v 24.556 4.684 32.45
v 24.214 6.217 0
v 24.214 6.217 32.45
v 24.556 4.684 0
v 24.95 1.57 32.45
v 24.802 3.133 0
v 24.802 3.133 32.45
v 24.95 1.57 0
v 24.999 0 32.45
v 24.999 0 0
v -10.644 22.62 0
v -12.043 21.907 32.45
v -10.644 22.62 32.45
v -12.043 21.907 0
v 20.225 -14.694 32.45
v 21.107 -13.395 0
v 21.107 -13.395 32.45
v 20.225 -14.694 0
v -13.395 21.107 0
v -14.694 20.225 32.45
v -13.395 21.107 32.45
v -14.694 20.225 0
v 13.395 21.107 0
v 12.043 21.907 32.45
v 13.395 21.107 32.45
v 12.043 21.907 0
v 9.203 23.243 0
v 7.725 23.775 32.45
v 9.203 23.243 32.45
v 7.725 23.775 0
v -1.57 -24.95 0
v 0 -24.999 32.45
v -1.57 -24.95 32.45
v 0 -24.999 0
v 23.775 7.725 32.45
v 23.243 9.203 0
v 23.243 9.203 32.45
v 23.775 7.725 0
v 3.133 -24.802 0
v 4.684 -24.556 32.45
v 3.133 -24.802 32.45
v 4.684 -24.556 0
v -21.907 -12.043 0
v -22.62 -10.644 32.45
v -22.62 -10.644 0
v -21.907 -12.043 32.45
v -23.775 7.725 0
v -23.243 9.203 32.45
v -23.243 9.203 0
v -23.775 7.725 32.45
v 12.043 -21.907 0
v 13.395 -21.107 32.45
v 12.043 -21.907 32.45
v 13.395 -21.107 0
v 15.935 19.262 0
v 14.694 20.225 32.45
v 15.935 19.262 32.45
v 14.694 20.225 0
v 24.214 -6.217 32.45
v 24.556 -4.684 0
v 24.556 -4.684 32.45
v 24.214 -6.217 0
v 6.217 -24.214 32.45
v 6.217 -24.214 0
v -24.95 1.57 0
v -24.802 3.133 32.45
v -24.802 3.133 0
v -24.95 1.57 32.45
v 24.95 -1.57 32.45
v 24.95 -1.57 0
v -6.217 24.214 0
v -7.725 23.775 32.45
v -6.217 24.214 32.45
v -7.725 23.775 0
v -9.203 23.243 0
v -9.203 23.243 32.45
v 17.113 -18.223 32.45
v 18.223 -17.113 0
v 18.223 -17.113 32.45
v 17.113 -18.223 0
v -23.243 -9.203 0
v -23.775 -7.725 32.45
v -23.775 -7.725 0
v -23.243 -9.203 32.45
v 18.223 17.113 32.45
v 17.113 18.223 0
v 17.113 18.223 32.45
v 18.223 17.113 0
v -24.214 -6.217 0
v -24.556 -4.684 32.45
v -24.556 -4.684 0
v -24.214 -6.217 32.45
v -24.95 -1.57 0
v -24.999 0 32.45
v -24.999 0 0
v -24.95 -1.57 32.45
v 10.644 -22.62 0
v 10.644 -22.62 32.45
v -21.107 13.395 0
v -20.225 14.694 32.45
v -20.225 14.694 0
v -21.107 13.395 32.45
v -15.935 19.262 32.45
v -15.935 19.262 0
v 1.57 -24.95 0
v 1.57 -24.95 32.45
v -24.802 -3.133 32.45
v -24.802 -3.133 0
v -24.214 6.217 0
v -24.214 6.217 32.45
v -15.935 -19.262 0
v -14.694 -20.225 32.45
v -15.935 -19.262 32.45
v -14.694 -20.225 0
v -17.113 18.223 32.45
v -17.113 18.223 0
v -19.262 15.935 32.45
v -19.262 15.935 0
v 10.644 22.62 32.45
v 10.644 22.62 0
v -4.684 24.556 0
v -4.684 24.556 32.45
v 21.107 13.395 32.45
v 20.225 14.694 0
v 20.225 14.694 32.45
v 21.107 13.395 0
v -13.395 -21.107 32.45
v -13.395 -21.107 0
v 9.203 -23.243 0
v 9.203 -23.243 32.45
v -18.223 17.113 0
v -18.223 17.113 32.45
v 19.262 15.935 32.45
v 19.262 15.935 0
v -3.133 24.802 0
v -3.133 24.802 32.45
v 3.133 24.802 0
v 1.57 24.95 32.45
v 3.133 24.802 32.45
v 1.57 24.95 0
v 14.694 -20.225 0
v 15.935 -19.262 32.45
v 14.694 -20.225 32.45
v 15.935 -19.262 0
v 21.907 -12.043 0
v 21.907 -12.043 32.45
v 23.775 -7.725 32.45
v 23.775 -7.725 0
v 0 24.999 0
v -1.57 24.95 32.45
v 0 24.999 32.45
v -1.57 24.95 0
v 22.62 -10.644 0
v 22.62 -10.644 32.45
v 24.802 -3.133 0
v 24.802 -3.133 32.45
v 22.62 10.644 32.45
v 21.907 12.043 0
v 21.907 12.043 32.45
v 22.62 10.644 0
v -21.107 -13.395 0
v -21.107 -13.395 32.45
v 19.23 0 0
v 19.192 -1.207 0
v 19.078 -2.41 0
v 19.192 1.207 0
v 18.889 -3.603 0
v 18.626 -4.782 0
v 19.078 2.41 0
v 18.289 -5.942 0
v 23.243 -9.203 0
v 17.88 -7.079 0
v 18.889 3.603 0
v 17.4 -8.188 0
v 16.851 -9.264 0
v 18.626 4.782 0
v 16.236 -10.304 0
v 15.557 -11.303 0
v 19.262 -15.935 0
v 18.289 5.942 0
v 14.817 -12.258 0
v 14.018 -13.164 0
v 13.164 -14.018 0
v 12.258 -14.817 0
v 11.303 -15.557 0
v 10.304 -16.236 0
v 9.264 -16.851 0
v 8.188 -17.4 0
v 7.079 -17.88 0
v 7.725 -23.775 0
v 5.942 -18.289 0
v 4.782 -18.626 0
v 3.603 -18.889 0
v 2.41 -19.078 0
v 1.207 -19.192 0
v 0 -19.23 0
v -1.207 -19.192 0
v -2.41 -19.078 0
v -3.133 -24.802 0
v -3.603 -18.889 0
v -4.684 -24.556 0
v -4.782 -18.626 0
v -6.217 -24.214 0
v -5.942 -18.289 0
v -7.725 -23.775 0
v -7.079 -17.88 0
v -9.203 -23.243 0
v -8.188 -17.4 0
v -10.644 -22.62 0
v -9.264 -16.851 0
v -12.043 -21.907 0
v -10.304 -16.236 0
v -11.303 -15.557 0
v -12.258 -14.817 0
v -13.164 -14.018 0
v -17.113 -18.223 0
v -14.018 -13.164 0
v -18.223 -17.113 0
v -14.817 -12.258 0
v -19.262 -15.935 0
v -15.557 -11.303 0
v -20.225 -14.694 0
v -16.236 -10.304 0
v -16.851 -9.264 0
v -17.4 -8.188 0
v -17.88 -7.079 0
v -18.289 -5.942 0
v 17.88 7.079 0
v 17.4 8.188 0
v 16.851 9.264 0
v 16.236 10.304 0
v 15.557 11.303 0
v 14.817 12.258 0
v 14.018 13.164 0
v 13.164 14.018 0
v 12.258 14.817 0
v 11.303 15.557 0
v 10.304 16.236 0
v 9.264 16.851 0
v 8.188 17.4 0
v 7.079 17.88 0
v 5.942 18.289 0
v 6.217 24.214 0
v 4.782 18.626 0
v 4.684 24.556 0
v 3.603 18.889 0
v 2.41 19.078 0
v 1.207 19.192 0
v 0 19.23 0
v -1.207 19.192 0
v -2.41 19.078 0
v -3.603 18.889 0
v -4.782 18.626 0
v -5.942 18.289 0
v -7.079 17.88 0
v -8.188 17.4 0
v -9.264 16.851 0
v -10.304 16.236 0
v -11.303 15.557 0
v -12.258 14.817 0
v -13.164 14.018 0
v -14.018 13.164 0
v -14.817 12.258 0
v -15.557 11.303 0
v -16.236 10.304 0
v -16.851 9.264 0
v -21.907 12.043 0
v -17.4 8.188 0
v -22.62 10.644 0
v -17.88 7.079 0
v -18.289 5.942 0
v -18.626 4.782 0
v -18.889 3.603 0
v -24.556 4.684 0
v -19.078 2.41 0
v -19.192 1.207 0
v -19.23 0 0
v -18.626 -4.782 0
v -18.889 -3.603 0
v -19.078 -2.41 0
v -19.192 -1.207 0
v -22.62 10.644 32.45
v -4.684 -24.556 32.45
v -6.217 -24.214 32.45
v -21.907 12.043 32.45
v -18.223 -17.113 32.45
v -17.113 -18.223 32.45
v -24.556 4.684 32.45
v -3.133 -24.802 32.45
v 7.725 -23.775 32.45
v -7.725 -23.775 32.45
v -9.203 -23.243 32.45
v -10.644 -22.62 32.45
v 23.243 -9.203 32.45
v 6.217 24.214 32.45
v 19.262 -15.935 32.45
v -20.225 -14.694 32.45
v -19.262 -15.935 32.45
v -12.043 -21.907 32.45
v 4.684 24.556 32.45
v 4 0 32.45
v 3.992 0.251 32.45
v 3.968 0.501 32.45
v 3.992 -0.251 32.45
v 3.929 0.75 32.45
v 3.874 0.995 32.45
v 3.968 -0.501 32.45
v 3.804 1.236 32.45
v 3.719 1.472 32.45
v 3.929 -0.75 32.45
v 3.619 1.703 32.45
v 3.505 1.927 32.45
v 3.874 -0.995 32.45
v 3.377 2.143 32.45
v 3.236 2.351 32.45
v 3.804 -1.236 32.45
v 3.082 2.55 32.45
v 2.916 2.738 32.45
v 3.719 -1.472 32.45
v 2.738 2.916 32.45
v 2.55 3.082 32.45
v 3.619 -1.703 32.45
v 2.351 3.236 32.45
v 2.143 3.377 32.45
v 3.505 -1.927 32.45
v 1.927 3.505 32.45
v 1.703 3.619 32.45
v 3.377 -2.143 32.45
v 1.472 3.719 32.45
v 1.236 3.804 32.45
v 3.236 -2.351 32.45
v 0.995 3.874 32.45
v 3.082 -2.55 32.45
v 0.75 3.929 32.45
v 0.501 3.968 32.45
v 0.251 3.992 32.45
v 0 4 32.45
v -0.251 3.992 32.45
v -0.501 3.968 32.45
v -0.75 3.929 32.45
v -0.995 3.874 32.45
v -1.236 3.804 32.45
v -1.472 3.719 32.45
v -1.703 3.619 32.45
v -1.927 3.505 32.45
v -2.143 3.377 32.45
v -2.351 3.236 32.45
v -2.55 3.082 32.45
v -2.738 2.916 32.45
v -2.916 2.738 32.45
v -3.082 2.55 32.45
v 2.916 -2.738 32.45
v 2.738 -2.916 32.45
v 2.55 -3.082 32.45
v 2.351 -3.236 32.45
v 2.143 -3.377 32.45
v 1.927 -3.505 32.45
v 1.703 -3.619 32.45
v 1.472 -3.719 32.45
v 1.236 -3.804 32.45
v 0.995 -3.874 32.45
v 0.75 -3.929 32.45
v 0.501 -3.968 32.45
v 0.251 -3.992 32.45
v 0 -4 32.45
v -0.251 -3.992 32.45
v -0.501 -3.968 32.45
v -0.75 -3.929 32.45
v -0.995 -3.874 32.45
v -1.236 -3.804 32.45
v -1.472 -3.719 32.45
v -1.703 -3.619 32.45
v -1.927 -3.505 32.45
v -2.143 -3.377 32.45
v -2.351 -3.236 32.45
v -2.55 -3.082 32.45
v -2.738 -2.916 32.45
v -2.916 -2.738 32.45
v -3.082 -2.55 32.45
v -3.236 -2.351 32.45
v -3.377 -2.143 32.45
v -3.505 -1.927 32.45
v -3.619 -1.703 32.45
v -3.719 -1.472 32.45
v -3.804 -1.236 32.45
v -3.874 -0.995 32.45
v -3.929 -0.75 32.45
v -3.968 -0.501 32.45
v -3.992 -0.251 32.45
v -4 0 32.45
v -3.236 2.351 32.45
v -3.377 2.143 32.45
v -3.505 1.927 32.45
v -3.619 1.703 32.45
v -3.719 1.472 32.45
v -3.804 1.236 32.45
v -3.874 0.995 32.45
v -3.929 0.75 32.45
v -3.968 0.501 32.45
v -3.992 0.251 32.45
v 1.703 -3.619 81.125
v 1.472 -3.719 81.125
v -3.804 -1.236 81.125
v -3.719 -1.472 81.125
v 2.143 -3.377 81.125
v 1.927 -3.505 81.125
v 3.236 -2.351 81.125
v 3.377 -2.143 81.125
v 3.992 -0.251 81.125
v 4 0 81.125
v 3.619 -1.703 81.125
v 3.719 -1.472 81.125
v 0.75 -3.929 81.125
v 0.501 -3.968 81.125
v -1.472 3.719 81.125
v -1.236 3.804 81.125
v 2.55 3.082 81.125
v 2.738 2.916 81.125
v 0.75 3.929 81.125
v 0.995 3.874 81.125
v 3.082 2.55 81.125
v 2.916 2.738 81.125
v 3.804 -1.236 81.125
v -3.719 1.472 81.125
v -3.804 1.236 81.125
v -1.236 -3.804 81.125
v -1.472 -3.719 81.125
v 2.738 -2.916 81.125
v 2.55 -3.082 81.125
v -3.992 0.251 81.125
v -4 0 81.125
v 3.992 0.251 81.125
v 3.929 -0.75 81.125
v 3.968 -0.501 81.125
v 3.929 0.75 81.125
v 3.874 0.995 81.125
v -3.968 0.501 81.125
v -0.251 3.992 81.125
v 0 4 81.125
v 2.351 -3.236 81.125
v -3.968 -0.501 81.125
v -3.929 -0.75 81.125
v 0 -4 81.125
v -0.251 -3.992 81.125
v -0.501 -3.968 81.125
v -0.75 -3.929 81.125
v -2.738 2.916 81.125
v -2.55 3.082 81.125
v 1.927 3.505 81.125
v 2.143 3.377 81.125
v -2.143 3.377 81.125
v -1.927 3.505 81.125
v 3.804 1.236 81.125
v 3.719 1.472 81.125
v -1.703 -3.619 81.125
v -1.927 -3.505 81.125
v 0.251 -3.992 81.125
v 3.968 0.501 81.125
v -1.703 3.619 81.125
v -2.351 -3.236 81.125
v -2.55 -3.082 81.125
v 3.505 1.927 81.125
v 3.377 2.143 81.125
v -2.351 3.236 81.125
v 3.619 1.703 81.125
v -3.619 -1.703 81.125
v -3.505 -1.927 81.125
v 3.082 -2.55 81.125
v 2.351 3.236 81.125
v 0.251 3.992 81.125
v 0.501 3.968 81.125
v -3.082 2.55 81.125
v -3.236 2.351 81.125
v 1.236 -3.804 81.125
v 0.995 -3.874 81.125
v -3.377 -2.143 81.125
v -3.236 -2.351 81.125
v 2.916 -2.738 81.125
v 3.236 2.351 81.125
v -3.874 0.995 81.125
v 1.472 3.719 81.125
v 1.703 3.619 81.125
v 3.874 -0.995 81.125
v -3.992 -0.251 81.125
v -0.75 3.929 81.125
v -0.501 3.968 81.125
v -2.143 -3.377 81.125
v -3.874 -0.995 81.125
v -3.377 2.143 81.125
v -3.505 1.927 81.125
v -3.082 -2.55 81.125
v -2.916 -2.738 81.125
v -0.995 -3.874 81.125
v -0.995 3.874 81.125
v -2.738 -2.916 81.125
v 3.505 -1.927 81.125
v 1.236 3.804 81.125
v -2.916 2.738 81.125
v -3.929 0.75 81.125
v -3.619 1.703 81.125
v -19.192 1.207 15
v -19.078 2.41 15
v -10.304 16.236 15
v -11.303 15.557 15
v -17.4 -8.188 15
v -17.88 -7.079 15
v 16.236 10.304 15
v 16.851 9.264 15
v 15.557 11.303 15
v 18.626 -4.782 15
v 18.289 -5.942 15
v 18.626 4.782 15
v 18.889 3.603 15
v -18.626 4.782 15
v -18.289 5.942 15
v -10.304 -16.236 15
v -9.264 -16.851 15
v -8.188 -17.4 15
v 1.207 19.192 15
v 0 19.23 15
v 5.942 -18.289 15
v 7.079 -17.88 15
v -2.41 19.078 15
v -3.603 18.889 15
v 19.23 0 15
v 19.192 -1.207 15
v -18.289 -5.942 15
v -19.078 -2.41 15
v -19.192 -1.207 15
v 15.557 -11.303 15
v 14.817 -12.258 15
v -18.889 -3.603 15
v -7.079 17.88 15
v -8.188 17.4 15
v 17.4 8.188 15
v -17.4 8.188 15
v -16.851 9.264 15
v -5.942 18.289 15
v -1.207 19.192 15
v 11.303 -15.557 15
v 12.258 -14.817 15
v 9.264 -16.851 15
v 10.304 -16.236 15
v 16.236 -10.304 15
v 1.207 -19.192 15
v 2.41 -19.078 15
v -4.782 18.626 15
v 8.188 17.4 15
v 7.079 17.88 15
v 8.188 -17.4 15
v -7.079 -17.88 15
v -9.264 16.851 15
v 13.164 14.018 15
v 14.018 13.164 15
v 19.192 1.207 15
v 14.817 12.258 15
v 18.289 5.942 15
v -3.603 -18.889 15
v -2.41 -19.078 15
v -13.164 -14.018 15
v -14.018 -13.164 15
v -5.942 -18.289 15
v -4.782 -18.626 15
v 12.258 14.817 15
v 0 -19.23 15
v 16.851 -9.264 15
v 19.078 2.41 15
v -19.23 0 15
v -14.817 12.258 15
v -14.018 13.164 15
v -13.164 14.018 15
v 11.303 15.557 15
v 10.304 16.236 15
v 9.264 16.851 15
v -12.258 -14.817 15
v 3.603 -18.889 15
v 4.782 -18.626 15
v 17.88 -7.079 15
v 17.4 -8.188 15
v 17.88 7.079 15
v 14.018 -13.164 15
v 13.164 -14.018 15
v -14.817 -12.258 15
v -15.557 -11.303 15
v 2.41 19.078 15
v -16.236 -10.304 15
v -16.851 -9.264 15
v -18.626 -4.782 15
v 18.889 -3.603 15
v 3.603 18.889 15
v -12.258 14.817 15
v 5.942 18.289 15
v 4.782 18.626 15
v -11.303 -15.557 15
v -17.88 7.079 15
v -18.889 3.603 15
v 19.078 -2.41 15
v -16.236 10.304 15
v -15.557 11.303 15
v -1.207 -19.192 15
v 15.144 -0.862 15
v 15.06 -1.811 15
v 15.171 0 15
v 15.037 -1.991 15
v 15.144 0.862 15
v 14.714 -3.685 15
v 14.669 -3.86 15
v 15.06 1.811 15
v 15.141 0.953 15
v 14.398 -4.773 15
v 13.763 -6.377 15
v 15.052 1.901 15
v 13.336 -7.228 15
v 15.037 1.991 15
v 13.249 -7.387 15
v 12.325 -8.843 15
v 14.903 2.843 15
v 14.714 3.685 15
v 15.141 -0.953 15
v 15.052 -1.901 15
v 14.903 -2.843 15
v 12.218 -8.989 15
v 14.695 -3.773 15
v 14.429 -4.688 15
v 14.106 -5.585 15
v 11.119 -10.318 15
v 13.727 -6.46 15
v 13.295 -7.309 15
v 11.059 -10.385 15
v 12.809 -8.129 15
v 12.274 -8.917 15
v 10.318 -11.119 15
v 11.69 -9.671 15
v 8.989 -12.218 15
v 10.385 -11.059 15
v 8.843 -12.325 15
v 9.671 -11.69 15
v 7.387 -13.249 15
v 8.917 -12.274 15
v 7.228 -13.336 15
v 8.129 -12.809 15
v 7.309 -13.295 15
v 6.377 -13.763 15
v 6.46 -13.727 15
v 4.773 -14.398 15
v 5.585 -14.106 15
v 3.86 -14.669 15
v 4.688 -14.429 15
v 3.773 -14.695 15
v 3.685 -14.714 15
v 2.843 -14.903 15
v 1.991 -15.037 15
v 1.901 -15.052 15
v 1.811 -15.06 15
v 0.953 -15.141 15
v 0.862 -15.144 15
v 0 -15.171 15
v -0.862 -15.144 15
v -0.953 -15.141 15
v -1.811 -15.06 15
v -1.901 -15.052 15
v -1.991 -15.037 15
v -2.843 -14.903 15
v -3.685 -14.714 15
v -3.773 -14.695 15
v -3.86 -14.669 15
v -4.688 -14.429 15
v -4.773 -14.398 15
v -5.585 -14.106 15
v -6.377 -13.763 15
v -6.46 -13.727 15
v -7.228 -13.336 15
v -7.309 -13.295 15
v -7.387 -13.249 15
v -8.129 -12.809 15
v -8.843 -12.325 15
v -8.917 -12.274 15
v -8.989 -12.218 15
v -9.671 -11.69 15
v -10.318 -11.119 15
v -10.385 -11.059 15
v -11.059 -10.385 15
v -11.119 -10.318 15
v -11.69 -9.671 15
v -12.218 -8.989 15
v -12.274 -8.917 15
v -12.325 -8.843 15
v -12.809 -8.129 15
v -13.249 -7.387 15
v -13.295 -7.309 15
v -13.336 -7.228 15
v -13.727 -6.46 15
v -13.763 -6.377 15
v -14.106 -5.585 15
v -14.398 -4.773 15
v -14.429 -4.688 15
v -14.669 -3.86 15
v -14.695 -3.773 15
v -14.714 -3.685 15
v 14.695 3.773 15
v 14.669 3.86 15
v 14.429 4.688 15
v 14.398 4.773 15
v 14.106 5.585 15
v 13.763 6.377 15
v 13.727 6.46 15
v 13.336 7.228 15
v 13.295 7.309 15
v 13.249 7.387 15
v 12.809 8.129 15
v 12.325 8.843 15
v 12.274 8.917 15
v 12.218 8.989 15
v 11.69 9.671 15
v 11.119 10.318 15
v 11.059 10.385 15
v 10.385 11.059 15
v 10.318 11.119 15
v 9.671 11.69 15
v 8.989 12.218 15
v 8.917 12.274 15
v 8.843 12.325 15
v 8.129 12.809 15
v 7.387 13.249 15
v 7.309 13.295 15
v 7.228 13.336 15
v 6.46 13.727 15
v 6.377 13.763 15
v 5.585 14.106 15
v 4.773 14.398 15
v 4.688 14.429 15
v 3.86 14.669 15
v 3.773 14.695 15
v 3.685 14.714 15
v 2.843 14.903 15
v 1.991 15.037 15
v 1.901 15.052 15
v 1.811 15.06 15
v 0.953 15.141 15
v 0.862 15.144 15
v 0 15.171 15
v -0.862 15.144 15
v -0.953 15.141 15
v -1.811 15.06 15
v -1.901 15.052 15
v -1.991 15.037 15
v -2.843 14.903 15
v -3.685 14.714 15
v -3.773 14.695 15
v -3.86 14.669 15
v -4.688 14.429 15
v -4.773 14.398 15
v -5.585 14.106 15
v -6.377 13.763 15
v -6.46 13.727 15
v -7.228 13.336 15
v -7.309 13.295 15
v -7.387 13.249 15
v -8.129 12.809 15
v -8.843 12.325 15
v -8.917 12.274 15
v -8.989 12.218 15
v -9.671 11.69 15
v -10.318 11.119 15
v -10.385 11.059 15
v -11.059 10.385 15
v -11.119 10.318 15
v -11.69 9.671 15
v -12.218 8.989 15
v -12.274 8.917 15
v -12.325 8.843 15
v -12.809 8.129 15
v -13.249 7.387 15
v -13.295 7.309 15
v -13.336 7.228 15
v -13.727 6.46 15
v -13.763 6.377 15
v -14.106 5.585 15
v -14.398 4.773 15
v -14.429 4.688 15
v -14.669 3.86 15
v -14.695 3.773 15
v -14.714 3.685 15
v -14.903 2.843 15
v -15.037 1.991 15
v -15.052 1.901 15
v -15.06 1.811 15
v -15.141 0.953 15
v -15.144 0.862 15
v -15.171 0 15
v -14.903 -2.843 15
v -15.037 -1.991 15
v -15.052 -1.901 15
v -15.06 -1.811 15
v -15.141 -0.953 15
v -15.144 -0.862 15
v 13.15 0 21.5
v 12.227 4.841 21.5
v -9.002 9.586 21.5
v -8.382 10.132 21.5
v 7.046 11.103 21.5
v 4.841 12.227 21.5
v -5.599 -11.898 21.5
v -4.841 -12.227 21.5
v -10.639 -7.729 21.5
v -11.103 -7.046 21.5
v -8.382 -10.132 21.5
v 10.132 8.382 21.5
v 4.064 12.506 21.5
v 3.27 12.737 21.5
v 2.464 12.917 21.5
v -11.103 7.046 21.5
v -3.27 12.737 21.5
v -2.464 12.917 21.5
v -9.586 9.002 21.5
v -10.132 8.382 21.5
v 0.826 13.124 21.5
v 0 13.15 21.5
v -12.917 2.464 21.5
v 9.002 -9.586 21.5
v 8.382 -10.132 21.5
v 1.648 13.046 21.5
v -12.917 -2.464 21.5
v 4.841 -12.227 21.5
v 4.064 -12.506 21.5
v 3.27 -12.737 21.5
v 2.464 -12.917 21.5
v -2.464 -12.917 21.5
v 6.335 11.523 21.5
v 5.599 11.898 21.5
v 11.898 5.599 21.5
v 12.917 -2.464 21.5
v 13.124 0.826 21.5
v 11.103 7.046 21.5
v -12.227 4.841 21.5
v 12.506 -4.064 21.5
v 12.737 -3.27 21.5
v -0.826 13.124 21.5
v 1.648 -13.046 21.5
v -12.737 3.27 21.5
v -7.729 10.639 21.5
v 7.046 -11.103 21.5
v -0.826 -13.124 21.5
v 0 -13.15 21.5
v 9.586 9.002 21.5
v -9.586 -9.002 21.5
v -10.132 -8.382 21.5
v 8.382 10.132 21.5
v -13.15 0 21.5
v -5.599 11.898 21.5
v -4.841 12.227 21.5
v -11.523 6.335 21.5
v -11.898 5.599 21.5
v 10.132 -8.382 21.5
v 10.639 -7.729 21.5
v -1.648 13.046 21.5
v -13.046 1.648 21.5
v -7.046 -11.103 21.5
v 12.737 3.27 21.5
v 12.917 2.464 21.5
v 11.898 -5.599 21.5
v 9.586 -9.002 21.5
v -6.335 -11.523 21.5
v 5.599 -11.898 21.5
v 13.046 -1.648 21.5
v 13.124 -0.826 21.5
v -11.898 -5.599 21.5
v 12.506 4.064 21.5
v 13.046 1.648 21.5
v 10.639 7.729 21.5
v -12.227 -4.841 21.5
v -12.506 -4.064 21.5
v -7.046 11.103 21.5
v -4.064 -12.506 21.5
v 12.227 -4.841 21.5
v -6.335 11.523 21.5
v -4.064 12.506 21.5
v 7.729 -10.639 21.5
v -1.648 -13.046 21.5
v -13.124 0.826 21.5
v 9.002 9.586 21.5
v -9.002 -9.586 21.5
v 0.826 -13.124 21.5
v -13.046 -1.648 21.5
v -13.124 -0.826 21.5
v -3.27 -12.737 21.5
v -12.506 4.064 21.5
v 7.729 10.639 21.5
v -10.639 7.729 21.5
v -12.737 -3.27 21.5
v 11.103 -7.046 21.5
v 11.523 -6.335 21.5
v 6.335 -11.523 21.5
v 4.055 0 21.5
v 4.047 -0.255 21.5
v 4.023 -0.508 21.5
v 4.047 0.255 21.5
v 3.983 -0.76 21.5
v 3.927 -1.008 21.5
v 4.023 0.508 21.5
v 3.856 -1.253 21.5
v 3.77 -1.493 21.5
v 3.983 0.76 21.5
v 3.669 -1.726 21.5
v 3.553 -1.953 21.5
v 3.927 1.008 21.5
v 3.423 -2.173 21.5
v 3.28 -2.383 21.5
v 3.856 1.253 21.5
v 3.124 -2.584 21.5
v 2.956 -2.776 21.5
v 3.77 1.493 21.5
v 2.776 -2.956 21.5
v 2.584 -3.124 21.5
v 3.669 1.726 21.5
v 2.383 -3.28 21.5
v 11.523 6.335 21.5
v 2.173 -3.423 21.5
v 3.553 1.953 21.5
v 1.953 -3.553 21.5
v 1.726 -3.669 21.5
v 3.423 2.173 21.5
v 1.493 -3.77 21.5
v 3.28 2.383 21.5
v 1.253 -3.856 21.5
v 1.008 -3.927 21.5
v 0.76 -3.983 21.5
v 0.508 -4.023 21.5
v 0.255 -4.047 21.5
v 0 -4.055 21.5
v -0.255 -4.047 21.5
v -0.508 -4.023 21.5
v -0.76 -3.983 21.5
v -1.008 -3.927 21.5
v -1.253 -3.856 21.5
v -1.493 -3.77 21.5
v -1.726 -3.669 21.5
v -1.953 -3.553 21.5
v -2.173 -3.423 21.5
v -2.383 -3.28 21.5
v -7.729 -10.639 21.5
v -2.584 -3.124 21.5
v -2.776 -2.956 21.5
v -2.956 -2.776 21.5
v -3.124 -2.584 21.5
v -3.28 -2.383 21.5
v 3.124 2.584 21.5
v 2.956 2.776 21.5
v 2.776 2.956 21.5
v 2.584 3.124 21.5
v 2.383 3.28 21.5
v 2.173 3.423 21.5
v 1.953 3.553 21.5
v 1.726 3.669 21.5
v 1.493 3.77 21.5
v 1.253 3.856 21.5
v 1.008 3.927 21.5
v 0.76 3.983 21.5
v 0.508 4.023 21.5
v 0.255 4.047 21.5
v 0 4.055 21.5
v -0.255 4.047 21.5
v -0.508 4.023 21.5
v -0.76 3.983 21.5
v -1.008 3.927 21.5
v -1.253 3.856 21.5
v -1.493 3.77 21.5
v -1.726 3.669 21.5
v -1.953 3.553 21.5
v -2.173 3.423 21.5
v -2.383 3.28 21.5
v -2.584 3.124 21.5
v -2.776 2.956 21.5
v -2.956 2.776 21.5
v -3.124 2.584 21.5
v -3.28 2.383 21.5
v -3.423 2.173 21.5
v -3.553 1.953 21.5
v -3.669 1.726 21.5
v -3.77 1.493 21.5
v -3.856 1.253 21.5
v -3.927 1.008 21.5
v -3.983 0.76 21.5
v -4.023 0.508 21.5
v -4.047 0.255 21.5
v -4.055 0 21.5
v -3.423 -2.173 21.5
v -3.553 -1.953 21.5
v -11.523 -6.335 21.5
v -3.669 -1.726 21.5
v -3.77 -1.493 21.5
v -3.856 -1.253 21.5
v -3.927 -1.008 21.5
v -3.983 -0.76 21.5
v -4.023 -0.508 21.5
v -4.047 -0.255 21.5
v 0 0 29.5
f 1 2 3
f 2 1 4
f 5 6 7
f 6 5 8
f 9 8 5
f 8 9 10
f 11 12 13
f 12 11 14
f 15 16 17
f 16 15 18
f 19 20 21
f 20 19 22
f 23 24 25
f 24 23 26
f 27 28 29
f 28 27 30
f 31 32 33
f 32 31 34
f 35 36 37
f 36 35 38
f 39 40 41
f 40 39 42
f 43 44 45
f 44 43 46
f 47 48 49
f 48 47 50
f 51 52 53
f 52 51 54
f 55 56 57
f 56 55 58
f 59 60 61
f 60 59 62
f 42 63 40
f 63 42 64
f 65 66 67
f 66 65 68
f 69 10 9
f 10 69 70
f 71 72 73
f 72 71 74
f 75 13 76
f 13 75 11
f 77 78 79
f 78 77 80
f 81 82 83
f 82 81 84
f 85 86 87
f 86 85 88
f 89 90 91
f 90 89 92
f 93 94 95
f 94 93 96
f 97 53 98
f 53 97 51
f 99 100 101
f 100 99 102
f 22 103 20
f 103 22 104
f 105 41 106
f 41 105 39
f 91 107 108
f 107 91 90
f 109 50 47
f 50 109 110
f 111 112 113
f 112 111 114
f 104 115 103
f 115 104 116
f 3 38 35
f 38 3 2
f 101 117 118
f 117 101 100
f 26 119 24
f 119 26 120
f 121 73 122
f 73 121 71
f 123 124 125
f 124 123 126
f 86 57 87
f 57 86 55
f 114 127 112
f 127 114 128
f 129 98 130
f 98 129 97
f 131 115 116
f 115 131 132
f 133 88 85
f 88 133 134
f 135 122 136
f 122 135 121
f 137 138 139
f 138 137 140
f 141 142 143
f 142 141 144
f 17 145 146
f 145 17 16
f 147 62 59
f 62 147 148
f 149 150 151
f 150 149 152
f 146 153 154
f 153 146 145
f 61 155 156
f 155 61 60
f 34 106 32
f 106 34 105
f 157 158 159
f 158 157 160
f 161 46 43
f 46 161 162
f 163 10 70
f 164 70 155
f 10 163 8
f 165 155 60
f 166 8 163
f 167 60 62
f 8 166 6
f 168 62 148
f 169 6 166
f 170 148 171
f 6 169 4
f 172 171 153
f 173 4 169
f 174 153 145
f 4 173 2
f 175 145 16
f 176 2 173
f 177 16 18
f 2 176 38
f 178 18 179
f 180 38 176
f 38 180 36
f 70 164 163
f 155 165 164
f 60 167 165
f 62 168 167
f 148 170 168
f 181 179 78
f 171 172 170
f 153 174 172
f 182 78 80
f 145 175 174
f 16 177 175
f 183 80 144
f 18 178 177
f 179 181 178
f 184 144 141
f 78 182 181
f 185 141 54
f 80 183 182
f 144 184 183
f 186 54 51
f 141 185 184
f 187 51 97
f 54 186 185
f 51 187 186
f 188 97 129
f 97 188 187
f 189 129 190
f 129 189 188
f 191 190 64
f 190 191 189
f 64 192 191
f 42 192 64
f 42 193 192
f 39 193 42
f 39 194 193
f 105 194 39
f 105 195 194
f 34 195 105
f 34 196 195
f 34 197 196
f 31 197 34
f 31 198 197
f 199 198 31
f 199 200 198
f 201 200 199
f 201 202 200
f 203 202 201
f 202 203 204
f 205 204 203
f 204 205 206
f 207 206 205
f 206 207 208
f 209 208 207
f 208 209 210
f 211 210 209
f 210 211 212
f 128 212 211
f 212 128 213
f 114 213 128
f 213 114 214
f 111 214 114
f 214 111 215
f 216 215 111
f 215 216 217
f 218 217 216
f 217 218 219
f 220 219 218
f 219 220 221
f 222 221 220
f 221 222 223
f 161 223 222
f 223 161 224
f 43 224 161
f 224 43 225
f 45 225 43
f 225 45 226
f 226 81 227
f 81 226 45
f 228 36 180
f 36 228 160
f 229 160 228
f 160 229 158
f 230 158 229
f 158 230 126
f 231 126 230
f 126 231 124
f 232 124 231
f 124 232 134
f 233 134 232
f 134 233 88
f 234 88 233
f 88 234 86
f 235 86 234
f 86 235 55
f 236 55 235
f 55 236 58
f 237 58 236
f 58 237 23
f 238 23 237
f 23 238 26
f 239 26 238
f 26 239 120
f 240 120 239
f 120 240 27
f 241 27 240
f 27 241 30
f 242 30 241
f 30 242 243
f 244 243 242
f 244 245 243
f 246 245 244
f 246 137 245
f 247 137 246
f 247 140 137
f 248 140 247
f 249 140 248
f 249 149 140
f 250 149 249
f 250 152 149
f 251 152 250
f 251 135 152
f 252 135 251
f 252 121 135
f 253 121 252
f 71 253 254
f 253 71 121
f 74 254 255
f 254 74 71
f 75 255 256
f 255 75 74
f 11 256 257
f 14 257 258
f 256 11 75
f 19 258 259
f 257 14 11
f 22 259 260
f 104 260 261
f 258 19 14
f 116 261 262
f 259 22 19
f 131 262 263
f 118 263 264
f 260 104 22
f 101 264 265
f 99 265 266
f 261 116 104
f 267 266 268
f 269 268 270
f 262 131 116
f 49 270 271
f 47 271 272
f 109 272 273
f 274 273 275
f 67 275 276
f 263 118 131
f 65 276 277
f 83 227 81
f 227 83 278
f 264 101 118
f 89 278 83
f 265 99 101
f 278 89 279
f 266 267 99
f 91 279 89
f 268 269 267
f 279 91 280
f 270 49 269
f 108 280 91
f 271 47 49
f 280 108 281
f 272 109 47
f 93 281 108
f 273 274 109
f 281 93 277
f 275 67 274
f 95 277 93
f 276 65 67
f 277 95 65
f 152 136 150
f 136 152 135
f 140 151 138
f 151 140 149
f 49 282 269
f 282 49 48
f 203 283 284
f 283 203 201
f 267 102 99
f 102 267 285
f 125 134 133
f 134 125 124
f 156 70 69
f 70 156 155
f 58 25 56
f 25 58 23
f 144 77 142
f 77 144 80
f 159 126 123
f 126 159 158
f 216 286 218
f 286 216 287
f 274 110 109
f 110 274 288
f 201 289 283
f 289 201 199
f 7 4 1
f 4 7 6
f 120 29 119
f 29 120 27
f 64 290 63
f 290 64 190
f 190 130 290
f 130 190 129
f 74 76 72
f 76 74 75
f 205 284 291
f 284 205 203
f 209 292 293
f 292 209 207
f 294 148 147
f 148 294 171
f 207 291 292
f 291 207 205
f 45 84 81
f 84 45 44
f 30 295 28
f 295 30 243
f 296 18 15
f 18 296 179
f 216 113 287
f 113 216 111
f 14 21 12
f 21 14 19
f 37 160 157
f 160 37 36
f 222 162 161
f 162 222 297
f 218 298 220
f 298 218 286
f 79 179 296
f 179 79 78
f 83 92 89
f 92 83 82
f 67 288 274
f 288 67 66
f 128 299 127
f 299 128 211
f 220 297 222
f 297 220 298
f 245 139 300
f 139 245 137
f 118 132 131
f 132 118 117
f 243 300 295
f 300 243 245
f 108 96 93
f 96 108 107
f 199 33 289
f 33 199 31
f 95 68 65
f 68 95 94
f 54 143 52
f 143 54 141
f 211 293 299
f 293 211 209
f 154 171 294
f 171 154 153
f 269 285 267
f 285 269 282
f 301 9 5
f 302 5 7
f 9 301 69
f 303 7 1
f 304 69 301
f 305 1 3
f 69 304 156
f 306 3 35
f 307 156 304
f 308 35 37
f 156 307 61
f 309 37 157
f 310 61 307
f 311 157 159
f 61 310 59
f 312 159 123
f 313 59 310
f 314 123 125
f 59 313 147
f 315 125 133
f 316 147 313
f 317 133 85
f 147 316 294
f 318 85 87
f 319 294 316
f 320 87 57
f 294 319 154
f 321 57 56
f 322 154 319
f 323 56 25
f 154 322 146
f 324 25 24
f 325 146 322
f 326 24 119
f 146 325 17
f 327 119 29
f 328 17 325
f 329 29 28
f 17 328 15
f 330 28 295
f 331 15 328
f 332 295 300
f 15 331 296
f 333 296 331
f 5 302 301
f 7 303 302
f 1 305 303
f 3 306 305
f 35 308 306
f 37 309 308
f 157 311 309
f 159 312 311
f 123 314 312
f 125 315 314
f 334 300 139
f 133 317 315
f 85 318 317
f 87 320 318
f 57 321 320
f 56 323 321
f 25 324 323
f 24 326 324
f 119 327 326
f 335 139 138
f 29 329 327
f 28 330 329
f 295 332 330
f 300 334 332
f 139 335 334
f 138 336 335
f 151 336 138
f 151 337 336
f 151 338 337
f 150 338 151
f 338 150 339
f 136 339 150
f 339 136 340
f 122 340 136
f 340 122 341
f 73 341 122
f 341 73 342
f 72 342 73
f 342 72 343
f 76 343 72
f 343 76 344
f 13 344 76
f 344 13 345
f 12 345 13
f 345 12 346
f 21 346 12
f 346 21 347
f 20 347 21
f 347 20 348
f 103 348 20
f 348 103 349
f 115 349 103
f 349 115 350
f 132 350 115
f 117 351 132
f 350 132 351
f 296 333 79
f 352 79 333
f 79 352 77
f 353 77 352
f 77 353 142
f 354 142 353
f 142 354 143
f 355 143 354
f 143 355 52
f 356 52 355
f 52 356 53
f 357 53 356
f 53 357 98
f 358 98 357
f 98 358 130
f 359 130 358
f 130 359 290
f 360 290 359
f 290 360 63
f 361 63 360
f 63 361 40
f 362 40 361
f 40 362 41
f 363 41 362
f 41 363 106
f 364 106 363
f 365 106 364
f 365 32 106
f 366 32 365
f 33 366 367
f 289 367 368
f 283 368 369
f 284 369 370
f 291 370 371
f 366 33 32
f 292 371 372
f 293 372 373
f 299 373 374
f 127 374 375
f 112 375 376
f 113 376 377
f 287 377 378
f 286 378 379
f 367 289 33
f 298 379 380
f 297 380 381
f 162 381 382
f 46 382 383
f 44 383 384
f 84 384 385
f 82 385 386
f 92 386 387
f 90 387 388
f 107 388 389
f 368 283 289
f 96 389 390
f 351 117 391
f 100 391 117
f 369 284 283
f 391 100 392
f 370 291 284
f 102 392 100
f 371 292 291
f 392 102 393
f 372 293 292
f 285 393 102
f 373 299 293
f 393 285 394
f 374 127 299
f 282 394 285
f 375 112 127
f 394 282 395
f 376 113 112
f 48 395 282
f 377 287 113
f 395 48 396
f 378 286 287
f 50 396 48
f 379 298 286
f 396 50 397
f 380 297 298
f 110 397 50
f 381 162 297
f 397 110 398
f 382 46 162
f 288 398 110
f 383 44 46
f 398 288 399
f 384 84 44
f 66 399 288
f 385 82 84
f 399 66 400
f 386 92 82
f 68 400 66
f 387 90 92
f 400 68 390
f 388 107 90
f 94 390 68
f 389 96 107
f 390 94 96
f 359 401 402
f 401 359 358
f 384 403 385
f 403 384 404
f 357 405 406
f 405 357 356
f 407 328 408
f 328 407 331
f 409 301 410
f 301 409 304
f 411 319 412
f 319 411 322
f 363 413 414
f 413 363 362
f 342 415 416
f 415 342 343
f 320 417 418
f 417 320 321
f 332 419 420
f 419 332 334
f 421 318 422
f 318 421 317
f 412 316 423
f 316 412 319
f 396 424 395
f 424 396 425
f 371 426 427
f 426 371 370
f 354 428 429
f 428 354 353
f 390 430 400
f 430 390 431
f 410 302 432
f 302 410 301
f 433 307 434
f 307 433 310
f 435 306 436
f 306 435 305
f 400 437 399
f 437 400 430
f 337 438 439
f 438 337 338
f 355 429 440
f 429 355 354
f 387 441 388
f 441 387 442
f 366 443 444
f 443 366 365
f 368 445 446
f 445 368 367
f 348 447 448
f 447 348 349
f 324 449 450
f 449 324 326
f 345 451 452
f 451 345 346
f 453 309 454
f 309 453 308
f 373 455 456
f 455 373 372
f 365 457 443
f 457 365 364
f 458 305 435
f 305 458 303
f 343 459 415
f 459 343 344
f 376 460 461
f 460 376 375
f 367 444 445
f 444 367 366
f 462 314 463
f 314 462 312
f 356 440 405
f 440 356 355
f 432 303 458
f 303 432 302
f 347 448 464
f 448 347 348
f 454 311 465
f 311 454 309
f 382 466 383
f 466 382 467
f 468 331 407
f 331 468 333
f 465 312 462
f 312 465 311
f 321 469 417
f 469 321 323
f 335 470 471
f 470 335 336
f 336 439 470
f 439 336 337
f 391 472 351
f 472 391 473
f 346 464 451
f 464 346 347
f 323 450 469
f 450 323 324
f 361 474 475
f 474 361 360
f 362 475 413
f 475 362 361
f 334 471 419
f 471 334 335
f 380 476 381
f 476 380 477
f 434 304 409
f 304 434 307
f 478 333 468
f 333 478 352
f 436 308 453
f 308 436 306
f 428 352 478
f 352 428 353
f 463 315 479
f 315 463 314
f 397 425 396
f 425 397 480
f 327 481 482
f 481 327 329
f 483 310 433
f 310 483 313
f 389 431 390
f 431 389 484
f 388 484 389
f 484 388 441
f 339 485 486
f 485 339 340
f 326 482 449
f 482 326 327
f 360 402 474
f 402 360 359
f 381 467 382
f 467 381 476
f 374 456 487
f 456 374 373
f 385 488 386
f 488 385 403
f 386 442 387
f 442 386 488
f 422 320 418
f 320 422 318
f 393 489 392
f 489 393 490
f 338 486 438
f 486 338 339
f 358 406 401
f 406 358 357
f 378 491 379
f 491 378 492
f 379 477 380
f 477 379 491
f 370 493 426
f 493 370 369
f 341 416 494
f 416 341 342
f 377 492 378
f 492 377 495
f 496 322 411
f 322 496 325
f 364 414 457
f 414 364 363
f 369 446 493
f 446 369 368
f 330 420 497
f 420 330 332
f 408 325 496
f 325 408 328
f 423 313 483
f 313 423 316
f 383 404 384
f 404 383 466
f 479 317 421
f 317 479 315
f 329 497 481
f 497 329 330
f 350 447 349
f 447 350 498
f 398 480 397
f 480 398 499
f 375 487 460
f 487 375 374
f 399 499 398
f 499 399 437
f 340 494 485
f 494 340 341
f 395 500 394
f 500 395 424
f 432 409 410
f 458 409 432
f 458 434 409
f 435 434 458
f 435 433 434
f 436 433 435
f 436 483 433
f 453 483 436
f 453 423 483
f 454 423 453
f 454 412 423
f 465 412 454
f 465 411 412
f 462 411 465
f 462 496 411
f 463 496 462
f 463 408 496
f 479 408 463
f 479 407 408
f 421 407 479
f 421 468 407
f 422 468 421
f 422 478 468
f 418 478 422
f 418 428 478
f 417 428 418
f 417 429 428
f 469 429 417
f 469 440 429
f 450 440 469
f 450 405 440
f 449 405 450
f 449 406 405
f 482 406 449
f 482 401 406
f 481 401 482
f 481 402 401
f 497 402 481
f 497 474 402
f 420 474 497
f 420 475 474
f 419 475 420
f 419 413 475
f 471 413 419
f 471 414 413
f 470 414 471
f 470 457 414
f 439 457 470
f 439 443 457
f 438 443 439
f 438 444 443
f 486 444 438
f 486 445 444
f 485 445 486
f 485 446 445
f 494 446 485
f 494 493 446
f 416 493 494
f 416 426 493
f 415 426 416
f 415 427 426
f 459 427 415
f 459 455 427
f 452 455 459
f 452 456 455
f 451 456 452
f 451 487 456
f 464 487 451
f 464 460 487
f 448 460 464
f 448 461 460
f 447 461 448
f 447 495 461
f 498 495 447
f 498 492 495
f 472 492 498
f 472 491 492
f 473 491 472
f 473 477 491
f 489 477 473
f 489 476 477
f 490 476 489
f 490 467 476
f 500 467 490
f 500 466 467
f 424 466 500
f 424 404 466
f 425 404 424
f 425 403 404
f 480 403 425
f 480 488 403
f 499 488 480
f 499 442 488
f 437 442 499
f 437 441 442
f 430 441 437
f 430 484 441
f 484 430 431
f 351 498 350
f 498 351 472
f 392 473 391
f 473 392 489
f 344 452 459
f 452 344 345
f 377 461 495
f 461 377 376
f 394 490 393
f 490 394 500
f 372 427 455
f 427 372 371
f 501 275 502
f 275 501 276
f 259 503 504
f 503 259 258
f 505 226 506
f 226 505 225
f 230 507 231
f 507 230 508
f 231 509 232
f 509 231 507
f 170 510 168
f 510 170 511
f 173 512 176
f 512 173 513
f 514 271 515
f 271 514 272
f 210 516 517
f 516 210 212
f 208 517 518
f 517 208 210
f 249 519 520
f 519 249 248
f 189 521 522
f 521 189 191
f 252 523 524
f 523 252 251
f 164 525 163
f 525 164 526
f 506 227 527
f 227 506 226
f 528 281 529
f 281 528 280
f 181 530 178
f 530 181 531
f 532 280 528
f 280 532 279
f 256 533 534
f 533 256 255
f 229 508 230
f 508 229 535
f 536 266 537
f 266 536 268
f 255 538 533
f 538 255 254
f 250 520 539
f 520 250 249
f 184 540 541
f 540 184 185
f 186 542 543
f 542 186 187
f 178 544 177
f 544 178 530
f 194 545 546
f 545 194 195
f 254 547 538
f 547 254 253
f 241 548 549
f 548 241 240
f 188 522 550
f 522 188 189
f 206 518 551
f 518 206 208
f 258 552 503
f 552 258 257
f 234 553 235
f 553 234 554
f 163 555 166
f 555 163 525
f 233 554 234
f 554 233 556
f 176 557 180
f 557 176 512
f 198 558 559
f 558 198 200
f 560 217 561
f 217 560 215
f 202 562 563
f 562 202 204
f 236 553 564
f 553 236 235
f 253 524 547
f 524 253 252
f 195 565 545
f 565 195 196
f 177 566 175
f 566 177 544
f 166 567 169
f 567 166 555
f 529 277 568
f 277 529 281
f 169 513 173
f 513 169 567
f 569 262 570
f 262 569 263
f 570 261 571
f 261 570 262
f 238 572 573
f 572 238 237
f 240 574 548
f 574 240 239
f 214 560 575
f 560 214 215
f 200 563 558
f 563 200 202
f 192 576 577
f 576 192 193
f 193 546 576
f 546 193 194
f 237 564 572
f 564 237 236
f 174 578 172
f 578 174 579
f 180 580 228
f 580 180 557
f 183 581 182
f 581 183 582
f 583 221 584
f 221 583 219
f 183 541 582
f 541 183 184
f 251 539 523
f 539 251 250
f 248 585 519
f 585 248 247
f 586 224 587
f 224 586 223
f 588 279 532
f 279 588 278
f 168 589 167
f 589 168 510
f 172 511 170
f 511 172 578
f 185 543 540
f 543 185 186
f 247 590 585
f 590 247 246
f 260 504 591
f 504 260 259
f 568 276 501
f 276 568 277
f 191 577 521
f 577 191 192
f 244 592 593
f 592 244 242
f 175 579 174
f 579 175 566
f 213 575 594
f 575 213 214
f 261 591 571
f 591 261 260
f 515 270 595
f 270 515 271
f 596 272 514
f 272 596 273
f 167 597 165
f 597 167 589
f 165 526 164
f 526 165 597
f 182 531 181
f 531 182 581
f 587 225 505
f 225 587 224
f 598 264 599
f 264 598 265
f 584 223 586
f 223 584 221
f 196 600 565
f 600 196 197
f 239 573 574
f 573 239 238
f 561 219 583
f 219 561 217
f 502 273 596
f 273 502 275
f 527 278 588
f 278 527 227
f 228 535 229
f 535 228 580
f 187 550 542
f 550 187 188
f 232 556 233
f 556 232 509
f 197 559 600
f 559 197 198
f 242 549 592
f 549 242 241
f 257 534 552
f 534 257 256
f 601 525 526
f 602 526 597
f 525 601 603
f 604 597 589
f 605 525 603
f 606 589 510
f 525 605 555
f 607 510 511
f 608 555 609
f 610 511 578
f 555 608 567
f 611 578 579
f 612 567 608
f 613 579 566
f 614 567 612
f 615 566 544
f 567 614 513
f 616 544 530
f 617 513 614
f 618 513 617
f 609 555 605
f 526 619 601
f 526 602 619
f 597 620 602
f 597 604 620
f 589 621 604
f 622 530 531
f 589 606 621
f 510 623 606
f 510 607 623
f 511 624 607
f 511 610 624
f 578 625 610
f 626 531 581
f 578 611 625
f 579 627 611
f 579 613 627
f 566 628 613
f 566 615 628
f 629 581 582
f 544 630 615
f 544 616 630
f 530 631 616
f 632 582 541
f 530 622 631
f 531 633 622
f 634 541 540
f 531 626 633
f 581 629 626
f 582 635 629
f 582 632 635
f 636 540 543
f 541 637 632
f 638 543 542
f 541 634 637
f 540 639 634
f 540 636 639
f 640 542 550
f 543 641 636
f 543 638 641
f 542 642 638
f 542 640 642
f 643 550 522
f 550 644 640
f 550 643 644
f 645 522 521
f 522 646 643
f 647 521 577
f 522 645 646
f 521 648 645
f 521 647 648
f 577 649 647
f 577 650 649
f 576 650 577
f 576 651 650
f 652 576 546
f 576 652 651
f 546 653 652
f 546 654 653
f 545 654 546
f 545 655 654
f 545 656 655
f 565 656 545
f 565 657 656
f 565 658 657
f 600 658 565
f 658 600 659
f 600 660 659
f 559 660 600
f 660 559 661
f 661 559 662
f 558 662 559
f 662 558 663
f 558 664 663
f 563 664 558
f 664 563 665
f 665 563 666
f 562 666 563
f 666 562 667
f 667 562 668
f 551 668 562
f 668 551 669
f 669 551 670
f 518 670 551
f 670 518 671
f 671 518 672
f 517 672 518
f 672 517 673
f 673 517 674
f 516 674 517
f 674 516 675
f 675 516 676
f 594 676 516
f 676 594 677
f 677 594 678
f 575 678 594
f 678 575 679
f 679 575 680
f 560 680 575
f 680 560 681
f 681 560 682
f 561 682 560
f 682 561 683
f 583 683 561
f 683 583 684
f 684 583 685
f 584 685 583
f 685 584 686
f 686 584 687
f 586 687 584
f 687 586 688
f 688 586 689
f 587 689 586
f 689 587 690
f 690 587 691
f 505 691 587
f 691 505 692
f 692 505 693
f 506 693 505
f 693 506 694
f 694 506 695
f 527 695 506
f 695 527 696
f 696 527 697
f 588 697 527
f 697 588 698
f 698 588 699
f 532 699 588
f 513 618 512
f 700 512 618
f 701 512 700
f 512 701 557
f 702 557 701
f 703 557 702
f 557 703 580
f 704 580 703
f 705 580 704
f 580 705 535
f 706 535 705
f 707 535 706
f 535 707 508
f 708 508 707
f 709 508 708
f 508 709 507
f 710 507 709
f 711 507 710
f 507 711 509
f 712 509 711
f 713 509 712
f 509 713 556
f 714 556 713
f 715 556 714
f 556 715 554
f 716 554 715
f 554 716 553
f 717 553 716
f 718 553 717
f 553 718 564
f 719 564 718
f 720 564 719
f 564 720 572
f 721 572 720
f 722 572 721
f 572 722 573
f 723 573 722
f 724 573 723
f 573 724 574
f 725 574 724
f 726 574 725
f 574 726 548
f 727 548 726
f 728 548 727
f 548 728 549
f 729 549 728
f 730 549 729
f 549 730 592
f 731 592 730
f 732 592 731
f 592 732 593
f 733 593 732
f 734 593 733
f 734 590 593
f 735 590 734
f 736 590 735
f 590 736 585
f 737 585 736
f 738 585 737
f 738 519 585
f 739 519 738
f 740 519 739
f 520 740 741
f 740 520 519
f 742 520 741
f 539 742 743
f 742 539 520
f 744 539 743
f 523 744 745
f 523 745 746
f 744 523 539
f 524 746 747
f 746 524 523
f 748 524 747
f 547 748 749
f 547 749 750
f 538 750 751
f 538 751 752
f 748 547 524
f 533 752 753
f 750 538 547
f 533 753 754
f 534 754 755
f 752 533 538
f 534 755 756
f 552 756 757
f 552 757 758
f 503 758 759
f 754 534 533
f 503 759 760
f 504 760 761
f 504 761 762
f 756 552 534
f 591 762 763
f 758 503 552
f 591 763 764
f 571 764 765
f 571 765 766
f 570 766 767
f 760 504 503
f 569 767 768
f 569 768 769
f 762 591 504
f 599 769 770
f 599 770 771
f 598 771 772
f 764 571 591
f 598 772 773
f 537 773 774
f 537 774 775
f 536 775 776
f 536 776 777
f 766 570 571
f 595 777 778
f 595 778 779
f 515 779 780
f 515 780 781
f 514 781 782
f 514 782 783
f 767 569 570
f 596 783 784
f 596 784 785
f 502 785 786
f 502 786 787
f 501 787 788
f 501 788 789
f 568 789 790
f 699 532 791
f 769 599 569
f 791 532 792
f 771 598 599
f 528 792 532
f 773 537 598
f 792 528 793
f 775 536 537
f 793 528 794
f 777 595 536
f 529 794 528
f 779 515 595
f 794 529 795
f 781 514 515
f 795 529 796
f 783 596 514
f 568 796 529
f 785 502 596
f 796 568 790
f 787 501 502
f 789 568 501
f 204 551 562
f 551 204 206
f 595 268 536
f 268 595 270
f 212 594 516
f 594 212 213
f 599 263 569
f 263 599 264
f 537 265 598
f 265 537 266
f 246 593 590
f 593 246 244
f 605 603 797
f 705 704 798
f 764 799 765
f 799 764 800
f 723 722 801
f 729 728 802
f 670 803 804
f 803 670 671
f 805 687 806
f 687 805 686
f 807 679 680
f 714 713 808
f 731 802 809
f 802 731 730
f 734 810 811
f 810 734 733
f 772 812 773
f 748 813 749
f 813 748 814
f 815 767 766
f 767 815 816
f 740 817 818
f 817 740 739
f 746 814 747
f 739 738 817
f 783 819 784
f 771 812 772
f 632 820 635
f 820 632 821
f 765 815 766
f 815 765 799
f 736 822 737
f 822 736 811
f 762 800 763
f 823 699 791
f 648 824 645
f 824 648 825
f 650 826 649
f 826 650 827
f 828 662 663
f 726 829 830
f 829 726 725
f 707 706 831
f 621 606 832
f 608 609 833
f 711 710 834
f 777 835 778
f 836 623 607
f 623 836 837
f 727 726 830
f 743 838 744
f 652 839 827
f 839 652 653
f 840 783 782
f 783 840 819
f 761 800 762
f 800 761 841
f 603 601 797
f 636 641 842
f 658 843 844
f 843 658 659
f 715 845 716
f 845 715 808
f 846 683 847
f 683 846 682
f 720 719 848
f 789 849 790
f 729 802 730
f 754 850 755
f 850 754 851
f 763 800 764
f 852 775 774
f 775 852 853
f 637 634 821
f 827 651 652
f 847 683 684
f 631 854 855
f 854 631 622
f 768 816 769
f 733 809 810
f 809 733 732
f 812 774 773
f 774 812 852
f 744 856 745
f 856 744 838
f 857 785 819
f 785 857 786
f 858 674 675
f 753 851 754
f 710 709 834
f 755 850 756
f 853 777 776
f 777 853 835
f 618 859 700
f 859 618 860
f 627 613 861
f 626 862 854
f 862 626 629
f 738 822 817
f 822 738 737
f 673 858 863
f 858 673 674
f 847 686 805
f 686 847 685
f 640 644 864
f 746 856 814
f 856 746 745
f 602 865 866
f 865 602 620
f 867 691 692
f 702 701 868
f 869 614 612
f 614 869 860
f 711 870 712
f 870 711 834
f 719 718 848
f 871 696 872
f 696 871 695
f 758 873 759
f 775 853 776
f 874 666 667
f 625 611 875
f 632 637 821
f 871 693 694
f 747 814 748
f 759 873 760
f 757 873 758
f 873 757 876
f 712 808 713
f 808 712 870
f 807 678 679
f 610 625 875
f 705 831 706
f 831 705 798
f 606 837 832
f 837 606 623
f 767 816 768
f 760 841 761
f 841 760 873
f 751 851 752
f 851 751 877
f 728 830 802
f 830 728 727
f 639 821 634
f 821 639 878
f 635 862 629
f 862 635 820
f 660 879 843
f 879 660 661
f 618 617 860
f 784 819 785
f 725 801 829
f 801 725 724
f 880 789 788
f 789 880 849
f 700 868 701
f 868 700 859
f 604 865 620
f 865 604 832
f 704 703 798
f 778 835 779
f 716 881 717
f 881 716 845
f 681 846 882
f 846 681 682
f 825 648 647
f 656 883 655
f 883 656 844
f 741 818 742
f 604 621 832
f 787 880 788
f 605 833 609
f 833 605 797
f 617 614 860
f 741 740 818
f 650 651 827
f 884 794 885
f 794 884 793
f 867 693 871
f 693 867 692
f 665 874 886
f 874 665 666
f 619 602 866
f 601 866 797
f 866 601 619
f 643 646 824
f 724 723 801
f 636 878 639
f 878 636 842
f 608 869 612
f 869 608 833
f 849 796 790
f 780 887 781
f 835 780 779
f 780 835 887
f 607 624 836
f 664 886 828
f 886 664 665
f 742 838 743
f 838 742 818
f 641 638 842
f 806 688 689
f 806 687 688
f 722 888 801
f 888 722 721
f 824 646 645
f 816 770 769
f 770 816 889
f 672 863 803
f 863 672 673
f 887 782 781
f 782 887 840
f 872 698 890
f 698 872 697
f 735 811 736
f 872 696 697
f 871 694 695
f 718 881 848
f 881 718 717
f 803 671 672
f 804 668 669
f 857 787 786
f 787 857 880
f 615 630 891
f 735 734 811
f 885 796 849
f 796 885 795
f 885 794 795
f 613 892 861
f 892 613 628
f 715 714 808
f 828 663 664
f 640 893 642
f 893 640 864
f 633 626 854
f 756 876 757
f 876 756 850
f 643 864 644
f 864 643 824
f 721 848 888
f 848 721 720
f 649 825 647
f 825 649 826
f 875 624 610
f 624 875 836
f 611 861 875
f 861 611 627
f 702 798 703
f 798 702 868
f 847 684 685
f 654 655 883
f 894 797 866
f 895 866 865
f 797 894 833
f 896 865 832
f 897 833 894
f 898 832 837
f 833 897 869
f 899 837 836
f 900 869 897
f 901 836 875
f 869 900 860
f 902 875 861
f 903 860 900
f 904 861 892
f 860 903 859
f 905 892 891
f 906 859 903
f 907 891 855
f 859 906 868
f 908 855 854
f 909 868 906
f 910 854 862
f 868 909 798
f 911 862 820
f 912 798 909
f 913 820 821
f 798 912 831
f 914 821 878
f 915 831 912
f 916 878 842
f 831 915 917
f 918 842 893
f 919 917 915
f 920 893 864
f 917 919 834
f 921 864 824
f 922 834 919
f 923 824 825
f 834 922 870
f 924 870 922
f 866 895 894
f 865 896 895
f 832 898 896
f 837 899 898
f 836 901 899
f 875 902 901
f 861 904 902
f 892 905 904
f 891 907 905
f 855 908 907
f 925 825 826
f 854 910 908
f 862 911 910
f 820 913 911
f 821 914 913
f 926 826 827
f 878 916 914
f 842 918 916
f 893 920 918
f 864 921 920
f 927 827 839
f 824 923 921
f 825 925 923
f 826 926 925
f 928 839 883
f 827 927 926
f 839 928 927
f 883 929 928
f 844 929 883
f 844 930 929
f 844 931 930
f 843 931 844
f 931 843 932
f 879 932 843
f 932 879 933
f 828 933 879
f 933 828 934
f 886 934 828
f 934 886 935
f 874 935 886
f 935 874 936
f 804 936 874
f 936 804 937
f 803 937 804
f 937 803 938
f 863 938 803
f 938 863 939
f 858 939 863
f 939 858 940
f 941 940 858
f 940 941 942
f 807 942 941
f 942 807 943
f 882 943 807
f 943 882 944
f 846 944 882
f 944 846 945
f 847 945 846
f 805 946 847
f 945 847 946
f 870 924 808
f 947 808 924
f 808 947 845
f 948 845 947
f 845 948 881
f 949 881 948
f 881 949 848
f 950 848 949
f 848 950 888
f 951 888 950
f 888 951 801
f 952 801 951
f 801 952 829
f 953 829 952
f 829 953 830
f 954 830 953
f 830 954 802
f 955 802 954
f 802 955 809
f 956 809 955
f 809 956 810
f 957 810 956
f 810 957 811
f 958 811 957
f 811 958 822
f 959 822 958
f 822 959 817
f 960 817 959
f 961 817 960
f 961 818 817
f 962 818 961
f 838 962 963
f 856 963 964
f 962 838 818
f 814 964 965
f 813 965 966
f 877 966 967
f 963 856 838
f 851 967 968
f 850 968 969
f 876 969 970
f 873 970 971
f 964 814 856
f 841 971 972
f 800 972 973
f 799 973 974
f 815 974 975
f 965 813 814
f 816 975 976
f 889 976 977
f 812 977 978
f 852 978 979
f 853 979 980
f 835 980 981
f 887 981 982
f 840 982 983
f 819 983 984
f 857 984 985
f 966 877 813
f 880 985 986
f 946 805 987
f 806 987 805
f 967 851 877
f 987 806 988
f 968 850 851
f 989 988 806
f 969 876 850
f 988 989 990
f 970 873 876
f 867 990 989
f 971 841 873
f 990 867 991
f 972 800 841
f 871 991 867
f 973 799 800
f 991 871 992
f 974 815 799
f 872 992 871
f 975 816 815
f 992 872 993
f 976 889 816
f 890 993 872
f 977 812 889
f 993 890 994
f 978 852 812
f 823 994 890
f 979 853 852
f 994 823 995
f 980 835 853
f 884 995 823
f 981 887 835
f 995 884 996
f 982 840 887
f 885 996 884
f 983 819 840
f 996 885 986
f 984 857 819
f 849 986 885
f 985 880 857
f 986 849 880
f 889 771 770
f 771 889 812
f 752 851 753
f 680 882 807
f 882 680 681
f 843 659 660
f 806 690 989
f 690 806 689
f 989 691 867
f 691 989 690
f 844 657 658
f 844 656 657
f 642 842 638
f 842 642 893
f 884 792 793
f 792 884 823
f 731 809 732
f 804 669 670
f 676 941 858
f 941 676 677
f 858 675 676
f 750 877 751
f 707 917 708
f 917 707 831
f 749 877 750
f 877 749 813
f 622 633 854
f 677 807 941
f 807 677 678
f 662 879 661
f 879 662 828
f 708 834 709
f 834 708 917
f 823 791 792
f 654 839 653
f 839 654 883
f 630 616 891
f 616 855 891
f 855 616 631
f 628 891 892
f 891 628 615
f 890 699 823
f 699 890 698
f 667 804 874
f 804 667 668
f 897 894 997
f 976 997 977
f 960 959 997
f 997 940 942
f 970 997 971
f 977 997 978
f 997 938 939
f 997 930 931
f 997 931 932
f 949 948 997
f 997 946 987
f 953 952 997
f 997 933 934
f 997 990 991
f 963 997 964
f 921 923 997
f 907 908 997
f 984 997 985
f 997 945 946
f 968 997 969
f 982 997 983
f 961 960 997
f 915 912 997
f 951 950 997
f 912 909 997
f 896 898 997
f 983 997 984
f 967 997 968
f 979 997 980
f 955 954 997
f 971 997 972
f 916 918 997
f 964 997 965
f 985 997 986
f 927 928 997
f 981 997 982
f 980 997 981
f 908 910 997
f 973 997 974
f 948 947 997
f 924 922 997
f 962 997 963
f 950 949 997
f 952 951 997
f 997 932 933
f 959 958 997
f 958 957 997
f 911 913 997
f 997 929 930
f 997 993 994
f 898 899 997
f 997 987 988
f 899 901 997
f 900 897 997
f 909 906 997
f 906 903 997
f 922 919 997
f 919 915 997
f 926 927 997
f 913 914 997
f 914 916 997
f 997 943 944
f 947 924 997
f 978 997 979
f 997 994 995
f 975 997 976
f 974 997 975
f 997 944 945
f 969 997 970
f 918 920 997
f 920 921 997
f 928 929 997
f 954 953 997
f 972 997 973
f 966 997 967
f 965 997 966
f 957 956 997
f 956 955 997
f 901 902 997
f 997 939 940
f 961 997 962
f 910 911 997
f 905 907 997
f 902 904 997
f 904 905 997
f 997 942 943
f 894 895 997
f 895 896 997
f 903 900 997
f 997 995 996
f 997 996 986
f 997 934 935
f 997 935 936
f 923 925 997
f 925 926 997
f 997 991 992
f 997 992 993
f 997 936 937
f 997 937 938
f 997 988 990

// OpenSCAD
$fn = 100;

eps = 0.8;
1st_in_diameter = 37.66 + eps; //[mm]
1st_in_height = 15;
2nd_1st_d = 30.04 + eps;
2nd_2nd_d = 25.5 + eps;
2nd_h = 6.5;
3rd_d = 8.12 + eps;
3rd_h = 8;

module inside() {
    translate([0, 0, -eps]) cylinder(h = 1st_in_height + eps, d = 1st_in_diameter);
    translate([0, 0, 1st_in_height - eps]) cylinder(h = 2nd_h + eps, d1 = 2nd_1st_d, d2 = 2nd_2nd_d);
    translate([0, 0, 1st_in_height + 2nd_h - eps]) cylinder(h = 3rd_h + eps, d1 = 3rd_d, d2 = 0);
}

module outside() {
    h = (1st_in_height + 2nd_h + 3rd_h) * 1.1;
    d = 1st_in_diameter * 1.3;
    cylinder(h = h, d = d);
    translate([0, 0, h - eps]) cylinder(h = 1.5 * h + eps, d = 8);
}

difference() {
    outside();
    inside();
}
